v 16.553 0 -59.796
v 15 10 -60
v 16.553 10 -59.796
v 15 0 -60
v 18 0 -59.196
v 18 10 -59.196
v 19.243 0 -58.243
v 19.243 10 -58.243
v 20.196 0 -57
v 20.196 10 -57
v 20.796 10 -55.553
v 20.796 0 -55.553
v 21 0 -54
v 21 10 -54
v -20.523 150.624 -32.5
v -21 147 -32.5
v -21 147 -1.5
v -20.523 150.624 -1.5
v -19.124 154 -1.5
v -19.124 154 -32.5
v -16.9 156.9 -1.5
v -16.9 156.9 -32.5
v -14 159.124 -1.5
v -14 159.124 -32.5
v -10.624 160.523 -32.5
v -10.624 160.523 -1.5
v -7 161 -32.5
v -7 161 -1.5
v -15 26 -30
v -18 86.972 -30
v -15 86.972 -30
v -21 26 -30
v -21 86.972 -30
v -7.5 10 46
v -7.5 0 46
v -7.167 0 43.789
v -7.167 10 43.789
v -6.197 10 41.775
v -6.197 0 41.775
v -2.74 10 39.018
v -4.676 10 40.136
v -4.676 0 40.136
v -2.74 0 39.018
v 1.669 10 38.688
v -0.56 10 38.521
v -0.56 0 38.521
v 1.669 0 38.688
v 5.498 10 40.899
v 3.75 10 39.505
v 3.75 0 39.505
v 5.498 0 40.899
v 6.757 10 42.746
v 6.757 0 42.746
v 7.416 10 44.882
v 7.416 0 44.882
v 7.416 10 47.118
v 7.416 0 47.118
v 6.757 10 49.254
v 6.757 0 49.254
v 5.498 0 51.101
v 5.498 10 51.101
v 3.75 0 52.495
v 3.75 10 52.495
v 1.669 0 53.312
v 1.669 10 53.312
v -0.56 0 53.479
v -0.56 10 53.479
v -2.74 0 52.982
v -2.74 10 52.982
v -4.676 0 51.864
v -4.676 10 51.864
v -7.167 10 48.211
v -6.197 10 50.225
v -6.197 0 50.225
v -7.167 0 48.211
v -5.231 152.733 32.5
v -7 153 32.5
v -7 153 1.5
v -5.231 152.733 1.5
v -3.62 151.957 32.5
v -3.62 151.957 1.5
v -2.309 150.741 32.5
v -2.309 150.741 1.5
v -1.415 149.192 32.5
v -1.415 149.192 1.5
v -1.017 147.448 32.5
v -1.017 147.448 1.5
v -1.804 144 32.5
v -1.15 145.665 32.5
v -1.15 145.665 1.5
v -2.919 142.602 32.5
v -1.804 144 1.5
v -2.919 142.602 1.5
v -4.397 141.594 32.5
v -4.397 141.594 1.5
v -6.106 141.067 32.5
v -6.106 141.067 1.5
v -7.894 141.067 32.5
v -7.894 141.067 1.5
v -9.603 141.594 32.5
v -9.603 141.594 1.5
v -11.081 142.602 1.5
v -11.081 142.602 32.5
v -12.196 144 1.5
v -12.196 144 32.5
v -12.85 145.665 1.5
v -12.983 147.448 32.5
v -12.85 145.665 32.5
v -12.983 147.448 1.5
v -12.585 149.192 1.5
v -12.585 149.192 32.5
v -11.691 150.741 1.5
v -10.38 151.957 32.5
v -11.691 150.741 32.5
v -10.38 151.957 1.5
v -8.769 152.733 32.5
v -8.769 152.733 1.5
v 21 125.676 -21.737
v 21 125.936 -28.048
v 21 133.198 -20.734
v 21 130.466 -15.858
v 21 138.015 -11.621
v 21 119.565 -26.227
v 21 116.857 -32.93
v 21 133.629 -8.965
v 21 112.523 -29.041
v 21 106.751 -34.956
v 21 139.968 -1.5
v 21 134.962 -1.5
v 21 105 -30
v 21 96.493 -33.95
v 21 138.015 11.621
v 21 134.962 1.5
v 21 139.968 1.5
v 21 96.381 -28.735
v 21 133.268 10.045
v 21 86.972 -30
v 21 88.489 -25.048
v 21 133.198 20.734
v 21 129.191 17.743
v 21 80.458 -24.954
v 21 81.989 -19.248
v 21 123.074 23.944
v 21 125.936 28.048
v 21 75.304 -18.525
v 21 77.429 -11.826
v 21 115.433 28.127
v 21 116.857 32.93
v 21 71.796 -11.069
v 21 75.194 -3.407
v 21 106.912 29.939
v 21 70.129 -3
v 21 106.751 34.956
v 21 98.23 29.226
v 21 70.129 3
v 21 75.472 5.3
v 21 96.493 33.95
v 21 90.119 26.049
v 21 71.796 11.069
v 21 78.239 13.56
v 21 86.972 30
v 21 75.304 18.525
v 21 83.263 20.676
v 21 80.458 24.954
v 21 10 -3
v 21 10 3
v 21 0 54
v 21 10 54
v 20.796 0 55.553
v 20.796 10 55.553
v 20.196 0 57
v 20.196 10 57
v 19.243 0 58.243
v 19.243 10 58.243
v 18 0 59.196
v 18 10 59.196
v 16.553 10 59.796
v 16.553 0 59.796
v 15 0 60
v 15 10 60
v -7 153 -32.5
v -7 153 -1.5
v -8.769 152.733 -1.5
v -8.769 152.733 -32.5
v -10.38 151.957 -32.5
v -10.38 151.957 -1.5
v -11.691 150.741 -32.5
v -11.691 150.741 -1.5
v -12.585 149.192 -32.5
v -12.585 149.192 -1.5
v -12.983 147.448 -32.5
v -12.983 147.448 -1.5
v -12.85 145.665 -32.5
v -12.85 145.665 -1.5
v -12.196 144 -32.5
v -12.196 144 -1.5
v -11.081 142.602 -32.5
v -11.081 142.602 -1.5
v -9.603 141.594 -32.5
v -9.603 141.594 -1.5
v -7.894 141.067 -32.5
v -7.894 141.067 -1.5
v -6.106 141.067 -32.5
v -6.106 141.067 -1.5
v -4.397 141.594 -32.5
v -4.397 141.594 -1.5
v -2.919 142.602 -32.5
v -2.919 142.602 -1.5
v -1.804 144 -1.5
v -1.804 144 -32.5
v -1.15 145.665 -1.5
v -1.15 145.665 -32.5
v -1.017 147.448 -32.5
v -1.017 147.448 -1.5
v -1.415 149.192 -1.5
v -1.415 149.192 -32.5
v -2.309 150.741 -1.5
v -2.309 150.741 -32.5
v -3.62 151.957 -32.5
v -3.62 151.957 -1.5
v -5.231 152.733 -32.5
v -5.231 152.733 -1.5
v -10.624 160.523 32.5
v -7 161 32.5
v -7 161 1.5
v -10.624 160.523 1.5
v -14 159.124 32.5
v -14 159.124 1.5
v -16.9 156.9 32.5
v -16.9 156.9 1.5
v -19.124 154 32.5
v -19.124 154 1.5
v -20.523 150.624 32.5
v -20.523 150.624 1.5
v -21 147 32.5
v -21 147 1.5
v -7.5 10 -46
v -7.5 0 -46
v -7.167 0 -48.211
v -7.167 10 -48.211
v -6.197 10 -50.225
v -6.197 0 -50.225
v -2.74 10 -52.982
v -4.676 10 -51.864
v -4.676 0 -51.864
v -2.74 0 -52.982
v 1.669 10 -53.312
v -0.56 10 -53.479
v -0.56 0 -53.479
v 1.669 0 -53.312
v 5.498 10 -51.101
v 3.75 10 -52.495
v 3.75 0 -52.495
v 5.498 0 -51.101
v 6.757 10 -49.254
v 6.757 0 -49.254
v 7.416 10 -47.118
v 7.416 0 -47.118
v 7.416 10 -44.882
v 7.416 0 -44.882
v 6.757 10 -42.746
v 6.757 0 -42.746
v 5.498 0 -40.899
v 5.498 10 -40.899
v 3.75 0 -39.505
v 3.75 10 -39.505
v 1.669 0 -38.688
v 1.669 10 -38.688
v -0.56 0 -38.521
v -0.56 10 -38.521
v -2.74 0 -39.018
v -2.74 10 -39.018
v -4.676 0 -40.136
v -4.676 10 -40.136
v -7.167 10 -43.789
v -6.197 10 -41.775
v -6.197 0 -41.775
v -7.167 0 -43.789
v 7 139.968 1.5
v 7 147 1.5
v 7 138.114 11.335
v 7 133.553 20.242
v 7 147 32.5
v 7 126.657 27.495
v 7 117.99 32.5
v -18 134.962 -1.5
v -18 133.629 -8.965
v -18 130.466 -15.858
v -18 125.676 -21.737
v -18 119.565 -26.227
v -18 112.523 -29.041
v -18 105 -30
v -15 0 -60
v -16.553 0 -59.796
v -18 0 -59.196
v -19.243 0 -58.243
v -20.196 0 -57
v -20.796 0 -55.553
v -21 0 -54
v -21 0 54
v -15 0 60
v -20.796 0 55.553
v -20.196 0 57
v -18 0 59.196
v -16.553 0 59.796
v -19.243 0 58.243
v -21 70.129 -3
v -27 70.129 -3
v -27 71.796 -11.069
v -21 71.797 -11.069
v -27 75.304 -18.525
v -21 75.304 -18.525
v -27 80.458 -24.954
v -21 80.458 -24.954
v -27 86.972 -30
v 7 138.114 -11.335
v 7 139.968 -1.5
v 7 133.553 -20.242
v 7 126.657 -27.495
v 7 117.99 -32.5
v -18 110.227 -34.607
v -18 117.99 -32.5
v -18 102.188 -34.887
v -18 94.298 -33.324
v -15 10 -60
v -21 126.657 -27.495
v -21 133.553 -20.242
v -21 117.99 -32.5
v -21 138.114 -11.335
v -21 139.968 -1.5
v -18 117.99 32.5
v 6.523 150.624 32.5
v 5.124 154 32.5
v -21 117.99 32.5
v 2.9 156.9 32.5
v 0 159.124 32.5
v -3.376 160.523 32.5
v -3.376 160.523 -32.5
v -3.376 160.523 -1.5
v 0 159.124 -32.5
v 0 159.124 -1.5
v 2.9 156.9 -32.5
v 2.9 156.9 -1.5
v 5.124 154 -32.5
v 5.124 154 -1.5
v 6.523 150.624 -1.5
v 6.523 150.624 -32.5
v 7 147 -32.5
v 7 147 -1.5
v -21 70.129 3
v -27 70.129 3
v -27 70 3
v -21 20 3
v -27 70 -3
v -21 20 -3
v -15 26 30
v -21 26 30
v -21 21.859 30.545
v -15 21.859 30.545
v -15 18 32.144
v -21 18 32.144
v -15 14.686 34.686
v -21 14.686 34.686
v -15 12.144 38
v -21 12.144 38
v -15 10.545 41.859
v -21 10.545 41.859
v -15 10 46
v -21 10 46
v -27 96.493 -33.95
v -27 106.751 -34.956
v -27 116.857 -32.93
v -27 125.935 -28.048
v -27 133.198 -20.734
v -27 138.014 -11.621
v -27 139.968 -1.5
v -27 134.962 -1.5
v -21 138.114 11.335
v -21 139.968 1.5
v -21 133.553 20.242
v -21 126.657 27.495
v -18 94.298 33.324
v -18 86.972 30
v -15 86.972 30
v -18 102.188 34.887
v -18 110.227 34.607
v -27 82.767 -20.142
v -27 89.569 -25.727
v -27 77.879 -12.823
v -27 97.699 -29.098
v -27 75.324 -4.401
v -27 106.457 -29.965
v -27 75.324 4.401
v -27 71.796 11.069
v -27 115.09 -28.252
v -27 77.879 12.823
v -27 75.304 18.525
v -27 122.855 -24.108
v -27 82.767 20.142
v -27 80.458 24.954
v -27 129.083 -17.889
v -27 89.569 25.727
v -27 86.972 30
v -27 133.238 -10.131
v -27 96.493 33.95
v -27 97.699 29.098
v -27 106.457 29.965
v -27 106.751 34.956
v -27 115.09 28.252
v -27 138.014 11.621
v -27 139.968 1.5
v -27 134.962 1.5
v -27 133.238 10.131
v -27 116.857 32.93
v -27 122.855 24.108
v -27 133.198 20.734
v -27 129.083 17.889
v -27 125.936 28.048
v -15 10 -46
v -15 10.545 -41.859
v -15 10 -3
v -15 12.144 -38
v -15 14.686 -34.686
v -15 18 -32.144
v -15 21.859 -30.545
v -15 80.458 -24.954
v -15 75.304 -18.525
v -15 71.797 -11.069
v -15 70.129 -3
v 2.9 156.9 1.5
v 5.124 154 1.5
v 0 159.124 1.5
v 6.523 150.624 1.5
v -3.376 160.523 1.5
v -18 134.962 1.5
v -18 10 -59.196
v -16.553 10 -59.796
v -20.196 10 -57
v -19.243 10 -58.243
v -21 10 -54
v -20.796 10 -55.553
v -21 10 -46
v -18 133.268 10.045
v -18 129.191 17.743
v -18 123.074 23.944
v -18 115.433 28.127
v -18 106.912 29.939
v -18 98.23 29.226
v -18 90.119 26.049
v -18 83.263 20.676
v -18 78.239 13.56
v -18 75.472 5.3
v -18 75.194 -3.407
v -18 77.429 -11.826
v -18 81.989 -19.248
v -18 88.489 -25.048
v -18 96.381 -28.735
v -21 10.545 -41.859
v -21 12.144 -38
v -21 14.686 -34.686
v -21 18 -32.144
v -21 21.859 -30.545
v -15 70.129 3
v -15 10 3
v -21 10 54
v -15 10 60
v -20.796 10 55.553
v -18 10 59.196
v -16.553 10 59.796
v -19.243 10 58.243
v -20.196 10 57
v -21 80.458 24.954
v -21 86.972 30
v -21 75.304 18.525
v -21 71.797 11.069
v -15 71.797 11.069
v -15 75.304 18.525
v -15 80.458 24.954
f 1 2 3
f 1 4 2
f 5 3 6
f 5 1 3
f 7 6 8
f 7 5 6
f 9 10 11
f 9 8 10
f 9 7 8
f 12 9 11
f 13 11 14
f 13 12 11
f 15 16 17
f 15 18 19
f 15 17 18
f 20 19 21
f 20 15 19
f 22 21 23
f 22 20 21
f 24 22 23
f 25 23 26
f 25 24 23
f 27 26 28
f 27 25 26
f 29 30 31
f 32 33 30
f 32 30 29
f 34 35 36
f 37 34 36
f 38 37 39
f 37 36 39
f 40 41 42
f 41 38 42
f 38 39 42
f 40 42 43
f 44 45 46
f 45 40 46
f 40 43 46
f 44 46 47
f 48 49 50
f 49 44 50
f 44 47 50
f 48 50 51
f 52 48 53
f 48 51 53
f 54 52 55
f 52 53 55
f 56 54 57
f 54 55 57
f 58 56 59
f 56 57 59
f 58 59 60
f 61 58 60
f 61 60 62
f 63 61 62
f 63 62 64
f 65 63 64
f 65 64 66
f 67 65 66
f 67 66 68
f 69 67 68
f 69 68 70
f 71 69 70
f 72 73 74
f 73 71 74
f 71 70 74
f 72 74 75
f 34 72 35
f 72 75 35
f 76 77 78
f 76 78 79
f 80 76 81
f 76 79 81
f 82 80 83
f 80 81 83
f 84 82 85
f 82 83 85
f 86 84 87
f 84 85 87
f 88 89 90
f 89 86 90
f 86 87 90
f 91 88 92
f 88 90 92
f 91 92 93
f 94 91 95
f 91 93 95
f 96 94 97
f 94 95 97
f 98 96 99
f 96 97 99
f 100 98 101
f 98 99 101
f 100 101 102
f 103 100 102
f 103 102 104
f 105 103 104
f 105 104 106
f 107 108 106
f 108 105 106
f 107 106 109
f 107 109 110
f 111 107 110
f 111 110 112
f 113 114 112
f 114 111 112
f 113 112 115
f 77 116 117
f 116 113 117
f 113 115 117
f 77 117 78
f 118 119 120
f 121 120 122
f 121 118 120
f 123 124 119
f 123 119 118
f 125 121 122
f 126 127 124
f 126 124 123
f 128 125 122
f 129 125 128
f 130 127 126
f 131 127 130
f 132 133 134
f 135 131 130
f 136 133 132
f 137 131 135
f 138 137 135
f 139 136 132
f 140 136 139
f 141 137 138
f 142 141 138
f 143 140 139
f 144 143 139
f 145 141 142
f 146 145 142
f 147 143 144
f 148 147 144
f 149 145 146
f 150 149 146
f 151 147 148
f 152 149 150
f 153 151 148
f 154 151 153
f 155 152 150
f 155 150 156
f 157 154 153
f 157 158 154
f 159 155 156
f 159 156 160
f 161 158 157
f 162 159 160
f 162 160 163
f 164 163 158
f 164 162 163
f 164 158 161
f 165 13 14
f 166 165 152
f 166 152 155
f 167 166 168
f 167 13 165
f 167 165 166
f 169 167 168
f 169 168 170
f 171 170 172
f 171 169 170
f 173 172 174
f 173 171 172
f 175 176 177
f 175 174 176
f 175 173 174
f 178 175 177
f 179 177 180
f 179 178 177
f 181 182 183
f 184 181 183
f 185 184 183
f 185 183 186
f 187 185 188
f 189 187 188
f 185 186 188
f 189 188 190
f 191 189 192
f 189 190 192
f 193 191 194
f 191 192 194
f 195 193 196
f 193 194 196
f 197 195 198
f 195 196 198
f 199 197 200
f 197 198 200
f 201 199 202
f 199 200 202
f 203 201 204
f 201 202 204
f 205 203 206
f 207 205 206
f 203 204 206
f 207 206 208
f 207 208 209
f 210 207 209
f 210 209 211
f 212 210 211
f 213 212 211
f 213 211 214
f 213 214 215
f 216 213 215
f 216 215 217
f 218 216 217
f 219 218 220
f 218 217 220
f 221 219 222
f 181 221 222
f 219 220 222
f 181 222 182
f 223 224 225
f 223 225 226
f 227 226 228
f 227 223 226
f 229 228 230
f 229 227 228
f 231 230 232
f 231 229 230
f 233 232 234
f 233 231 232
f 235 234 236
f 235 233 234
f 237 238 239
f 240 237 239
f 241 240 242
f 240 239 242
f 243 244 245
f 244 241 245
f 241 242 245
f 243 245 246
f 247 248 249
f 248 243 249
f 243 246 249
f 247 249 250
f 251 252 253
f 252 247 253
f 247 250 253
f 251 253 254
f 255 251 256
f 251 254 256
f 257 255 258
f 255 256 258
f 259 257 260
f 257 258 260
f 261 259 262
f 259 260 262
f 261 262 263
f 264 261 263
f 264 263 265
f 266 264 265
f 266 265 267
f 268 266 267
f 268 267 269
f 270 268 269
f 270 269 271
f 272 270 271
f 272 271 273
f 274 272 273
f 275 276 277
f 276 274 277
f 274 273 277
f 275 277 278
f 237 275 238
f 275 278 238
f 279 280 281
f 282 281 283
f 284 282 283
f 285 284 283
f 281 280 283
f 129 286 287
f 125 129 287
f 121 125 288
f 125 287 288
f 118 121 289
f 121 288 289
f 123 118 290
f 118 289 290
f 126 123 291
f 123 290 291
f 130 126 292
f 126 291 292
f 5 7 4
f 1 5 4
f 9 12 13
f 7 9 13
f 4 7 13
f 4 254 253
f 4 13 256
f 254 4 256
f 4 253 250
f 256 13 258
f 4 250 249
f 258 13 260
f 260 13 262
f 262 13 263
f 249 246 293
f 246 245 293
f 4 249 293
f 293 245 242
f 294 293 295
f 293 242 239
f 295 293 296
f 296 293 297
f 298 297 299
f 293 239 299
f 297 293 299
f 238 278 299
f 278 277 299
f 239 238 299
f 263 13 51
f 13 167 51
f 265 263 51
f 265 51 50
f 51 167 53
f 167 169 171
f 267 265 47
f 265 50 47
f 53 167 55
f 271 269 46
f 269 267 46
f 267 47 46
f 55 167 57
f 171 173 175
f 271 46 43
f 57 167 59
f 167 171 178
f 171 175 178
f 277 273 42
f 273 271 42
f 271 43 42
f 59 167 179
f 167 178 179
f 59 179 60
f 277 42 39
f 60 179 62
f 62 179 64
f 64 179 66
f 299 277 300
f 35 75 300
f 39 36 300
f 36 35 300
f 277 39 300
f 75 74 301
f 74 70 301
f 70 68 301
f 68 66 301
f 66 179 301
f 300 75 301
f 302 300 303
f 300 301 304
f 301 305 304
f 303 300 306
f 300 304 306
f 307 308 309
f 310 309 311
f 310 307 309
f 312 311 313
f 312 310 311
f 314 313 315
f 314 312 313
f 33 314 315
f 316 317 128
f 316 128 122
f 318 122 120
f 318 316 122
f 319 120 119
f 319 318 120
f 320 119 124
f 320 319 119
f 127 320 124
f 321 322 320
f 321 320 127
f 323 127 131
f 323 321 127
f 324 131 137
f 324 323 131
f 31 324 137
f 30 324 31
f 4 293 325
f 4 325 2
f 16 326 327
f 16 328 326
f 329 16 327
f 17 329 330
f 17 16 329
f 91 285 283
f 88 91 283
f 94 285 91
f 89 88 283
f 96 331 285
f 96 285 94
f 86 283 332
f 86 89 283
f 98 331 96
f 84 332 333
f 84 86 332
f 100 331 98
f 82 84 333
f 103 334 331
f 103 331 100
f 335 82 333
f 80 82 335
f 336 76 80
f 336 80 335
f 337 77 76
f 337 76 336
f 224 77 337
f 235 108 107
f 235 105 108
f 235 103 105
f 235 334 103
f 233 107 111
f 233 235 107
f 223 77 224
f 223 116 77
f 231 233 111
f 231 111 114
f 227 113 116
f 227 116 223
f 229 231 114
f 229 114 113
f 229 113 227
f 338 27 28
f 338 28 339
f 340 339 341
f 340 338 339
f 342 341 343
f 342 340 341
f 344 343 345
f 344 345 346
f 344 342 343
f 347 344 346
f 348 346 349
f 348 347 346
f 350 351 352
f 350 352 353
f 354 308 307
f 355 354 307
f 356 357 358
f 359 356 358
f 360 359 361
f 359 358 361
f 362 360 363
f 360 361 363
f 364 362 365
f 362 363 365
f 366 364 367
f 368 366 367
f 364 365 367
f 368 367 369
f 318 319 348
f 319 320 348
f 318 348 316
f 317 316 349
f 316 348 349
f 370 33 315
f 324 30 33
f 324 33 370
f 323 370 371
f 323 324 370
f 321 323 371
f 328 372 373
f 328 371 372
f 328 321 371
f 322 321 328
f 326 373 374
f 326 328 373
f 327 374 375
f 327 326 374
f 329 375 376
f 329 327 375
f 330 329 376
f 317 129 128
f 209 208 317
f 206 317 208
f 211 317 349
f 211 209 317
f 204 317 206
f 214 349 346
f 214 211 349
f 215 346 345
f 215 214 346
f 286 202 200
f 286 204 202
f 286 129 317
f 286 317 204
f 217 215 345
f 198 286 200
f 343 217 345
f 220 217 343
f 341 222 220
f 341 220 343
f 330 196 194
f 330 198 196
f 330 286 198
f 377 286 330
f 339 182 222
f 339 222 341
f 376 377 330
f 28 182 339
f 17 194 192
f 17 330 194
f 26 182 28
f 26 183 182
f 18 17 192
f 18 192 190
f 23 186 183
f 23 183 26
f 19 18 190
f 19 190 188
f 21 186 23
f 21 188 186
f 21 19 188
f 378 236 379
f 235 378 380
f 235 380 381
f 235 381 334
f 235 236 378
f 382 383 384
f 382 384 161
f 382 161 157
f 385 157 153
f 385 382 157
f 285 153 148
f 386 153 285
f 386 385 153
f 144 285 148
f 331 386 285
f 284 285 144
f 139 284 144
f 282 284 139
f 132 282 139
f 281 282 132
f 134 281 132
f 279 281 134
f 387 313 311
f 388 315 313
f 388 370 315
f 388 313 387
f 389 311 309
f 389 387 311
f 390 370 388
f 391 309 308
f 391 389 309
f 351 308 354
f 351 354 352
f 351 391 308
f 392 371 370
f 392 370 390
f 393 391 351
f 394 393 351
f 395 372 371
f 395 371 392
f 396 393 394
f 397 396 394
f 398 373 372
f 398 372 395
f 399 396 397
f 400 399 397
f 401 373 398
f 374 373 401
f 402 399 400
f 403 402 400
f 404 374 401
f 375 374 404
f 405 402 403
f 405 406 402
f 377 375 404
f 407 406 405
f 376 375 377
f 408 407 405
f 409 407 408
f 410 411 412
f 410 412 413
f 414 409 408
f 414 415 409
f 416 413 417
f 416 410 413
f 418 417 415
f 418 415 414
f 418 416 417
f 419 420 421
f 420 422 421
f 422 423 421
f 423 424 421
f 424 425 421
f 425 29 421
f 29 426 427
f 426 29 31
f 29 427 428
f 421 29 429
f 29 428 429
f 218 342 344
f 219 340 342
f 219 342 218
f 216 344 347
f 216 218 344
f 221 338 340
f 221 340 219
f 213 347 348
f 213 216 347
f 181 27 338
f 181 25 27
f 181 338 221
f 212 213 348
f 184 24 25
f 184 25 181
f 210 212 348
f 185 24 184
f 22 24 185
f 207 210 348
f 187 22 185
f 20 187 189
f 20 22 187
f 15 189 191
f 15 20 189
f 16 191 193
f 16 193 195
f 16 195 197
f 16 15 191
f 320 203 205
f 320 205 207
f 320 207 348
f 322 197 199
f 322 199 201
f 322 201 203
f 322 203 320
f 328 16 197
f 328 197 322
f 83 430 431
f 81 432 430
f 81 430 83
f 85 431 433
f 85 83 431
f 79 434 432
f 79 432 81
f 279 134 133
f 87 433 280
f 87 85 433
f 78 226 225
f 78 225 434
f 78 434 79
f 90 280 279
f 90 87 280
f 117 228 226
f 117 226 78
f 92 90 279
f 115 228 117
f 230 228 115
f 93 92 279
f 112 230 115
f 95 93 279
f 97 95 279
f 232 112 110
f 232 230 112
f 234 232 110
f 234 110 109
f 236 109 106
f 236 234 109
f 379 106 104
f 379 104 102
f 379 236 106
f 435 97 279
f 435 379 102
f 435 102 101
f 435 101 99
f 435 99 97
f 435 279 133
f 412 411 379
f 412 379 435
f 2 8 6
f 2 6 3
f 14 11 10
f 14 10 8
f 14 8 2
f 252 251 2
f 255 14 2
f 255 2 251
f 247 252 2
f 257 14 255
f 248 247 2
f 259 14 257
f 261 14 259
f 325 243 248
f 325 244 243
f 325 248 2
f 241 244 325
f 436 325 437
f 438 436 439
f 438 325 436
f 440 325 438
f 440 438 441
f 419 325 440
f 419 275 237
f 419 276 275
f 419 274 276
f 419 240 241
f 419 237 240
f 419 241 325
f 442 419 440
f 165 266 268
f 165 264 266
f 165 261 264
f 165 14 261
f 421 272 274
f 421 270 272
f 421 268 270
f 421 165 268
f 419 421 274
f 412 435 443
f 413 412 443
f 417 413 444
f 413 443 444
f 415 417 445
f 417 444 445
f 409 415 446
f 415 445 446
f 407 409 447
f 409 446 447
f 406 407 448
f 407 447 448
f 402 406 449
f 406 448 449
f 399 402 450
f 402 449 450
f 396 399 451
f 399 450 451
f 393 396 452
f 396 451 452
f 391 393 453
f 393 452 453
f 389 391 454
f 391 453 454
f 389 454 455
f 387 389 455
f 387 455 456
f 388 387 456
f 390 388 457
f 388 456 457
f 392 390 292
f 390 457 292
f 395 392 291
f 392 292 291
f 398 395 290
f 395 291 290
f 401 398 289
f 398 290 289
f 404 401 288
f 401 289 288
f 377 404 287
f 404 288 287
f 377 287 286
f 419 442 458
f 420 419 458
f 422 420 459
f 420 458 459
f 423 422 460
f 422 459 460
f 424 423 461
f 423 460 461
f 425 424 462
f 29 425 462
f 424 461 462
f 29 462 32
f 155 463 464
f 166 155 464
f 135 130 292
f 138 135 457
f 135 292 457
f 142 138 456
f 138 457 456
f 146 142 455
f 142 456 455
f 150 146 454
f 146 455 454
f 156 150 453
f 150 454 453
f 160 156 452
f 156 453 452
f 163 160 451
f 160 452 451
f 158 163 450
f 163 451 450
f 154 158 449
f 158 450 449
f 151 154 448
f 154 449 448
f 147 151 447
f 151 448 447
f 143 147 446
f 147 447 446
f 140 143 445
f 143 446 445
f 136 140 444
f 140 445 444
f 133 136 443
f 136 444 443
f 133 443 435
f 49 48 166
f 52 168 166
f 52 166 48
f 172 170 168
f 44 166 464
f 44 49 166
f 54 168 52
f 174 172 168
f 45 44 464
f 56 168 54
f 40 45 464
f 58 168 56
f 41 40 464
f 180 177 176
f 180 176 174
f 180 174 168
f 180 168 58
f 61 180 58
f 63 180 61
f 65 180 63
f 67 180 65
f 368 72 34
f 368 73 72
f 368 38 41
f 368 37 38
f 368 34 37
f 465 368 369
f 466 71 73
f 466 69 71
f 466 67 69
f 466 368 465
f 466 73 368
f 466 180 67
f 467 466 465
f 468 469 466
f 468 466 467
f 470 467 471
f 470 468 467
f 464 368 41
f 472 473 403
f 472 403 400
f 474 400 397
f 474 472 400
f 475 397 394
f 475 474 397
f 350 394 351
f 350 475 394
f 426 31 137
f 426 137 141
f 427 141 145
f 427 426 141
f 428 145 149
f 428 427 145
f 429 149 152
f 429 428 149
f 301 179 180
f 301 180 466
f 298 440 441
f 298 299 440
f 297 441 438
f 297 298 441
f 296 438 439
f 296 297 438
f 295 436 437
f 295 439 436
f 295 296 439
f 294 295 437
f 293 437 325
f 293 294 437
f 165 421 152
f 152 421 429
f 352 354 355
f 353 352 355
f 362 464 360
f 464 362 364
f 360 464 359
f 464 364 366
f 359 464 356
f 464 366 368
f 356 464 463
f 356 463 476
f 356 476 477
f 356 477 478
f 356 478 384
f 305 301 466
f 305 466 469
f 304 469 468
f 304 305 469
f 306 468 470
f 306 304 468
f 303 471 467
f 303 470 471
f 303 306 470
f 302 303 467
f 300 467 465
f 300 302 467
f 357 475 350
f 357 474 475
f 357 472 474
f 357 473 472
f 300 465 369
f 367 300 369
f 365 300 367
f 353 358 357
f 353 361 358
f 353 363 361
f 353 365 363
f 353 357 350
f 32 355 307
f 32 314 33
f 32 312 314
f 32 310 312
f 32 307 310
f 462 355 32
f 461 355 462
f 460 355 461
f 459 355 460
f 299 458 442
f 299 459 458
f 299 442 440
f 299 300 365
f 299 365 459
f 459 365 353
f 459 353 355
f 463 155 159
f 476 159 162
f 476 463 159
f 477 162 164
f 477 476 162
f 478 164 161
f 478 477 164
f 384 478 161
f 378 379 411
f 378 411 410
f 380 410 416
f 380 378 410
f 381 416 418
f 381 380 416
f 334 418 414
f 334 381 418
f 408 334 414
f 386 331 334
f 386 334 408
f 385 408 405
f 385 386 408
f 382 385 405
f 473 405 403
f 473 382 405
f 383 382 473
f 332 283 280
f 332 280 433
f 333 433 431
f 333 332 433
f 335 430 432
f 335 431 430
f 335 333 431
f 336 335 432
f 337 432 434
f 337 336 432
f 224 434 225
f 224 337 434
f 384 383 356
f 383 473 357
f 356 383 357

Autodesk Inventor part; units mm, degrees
ref_plane "YZ Plane" through (0, 0, 0) normal (1, 0, 0) x (0, 1, 0)
ref_plane "XZ Plane" through (0, 0, 0) normal (0, 1, 0) x (-1, 0, 0)
sketch "Boceto1" plane through (0, 0, 0) normal (0, 1, 0) x (-1, 0, 0)
  line L0 (-15, 60) -> (15, 60)
  line L1 (21, 54) -> (21, -54)
  line L2 (15, -60) -> (-15, -60)
  line L3 (-21, -54) -> (-21, 54)
  line L4 (-21, 60) -> (21, -60) construction
  line L5 (21, 60) -> (-21, -60) construction
  arc A0 (21, 54) -> (15, 60) centre (15, 54) ccw
  arc A1 (-15, 60) -> (-21, 54) centre (-15, 54) ccw
  arc A2 (-21, -54) -> (-15, -60) centre (-15, -54) ccw
  arc A3 (15, -60) -> (21, -54) centre (15, -54) ccw
  circle A4 centre (0, 46) radius 7.5
  circle A5 centre (0, -46) radius 7.5
  point P0 (0, 0)
  dimension "d0" = 42
  dimension "d1" = 120
  dimension "d2" = 6
  dimension "d3" = 15
  dimension "d13" = 46
  dimension "d14" = 46
extrude "Extrusión1" add sketch "Boceto1" along normal blind 10
sketch "Boceto2" plane through (-21, 0, -54) normal (-1, 0, 0) x (0, 0, 1)
  line L0 (0, 10) -> (108, 10) construction
  line L1 (24, 86.9722) -> (24, 26)
  line L2 (84, 86.9722) -> (84, 26)
  line L3 (0, 0) -> (108, 0) projected
  arc A0 (84, 26) -> (100, 10) centre (100, 26) ccw
  arc A1 (8, 10) -> (24, 26) centre (8, 26) ccw
  line L4 (92.5, 10) -> (107.5, 10) construction
  line L5 (0.5, 10) -> (15.5, 10) construction
  circle A2 centre (54, 105) radius 35
  line L6 (8, 10) -> (100, 10)
  point P0 (54, 0)
  point P1 (24, 10)
  point P2 (84, 10)
  point P3 (54, 0)
  point P4 (54, 0)
  point P5 (54, 10)
  dimension "d10" = 16
  dimension "d16" = 35
  dimension "d17" = 95
extrude "Extrusión2" add sketch "Boceto2" against normal blind 6 contours A2 L2 A0 L6 A1 L1
ref_plane "Plano de trabajo1" through (-18, 0, -54) normal (1, 0, 0) x (0, 0, -1)
sketch "Boceto3" plane through (-18, 0, -54) normal (1, 0, 0) x (0, 0, -1)
  arc A0 (-84, 86.9722) -> (-24, 86.9722) centre (-54, 105) ccw projected
  circle A1 centre (-54, 105) radius 35
  circle A2 centre (-54, 105) radius 30
  line L0 (-57, 10) -> (-51, 10)
  line L1 (-51, 10) -> (-51, 70.1288)
  line L2 (-51, 70.1288) -> (-57, 70.1288)
  line L3 (-57, 70.1288) -> (-57, 10)
  line L4 (-57, 10) -> (-51, 70.1288) construction
  line L5 (-51, 10) -> (-57, 70.1288) construction
  line L6 (-8, 10) -> (-100, 10) projected
  line L7 (-55.5, 105) -> (-52.5, 105)
  line L8 (-52.5, 105) -> (-52.5, 175)
  line L9 (-52.5, 175) -> (-55.5, 175)
  line L10 (-55.5, 175) -> (-55.5, 105)
  line L11 (-55.5, 105) -> (-52.5, 175) construction
  line L12 (-52.5, 105) -> (-55.5, 175) construction
  point P0 (-54, 0)
  point P1 (-54, 40.0644)
  point P2 (-54, 140)
  point P3 (-55.5, 134.9625)
  point P4 (-55.5, 139.9678)
  point P5 (-52.5, 139.9678)
  point P6 (-52.5, 134.9625)
  dimension "d23" = 39
  dimension "d20" = 30
  dimension "d21" = 6
  dimension "d22" = 3
extrude "Extrusión3" add sketch "Boceto3" along normal up to surface (39 mm away) contours A1 L10 A2 L8 A0 L2 | L2 A0 | A0 L1 L0 L3
sketch "Boceto4" plane through (-18, 0, -54) normal (-1, 0, 0) x (0, 0, 1)
  arc A0 (24, 86.9722) -> (84, 86.9722) centre (54, 105) ccw projected
  arc A1 (84, 86.9722) -> (55.5, 139.9678) centre (54, 105) ccw projected
  line L0 (55.5, 134.9625) -> (55.5, 139.9678) projected
  arc A2 (52.5, 134.9625) -> (55.5, 134.9625) centre (54, 105) ccw projected
  line L1 (52.5, 139.9678) -> (52.5, 134.9625) projected
  arc A3 (52.5, 139.9678) -> (24, 86.9722) centre (54, 105) ccw projected
  point P0 (54, 0)
extrude "Extrusión4" add sketch "Boceto4" along normal blind 9
sketch "Sketch6" plane through (-21, 0, -54) normal (-1, 0, 0) x (0, 0, 1)
  arc A0 (52.5, 139.9678) -> (55.5, 139.9678) centre (54, 105) ccw projected
  line L0 (52.5, 139.9678) -> (52.5, 161)
  line L1 (52.5, 161) -> (21.5, 161)
  line L2 (21.5, 161) -> (21.5, 117.9904)
  line L3 (21.5, 147) -> (52.5, 147) construction
  point P0 (54, 0)
  dimension "d30" = 31
  dimension "d31" = 42
  dimension "d32" = 14
extrude "Extrusion5" add sketch "Sketch6" against normal blind 28
fillet "Fillet1" radius 14 2 edges at (7, 161, -17) (-21, 161, -17)
sketch "Sketch7" plane through (7, 117.9904, -32.5) normal (0, 0, -1) x (-1, 0, 0)
  arc A0 (28, 29.0096) -> (0, 29.0096) centre (14, 29.0096) ccw projected
  point P0 (7, -117.9904)
hole "Hole1" at (-7, 147, -32.5) direction (0, 0, 1) diameter 12 depth 31
mirror "Mirror1" about plane through (0, 0, 0) normal (0, 0, 1) of "Extrusion5", "Fillet1", "Hole1"
sketch "Sketch8" plane through (0, 0, 0) normal (0, 0, 1) x (1, 0, 0)
  line L0 (-27, 70) -> (-21, 70) projected
  line L1 (-21, 0) -> (-21, 10) projected
  line L2 (-21, 10) -> (-21, 26) projected
  line L3 (-21, 26) -> (-21, 86.9722) projected
  line L4 (-21, 86.9722) -> (-21, 86.9722) projected
  line L5 (-21, 86.9722) -> (-21, 26) projected
  line L6 (-21, 26) -> (-21, 10) projected
  line L7 (-21, 0) -> (-21, 10) projected
  line L8 (-27, 70) -> (-21, 20)
  line L9 (-27, 139.9678) -> (-27, 70) projected
  line L10 (-27, 70) -> (-27, 73)
  line L11 (-27, 73) -> (-21, 73)
  point P0 (0, 0)
  dimension "d43" = 20
  dimension "d44" = 3
extrude "Extrusion6" add sketch "Sketch8" along normal mid plane 6
